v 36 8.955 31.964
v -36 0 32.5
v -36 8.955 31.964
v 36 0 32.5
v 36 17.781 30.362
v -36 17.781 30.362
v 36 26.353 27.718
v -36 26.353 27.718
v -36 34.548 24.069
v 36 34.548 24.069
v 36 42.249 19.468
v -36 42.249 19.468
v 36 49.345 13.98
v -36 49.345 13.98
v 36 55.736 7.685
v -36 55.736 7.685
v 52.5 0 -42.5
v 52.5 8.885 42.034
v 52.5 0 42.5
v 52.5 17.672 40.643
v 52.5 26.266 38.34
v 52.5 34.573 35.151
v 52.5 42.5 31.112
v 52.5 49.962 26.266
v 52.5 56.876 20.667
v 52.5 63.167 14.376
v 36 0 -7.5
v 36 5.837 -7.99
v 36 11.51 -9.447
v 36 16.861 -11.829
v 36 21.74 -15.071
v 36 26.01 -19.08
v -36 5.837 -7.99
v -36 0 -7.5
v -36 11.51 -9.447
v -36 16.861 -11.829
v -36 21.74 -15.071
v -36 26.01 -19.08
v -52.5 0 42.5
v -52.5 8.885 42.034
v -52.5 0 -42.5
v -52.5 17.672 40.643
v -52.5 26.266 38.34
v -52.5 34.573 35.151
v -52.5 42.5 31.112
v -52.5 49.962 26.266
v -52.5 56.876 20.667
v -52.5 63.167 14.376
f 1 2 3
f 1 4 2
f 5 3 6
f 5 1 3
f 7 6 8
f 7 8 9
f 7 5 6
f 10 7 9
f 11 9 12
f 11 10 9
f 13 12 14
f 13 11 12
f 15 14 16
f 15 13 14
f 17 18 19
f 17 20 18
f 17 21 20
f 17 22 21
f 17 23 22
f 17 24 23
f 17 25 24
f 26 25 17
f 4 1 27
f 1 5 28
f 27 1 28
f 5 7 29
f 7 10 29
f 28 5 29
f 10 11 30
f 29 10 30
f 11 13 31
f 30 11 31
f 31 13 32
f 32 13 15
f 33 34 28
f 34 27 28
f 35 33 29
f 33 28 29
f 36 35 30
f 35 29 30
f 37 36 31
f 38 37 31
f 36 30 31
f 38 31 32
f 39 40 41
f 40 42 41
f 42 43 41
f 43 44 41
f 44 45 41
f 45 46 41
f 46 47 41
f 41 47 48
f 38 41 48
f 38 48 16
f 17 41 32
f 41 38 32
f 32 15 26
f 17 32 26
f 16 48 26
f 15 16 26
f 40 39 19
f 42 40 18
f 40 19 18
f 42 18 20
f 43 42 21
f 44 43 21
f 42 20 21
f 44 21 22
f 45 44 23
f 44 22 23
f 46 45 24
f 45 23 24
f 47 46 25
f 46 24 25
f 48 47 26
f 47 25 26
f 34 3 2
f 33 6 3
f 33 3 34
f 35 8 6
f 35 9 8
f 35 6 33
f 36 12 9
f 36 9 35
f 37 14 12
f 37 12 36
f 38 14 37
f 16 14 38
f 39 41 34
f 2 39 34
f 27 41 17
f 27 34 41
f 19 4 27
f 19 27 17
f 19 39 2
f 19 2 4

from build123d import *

# Parameters (mm, degrees)
F0_W     = 105
F0_H     = 85
F0_W_2   = 72
F0_H_2   = 40
F1_ANGLE = 48


with BuildPart() as f1:
    # F0 (on Front) → F1 (revolve)
    with BuildSketch(Plane.XZ):
        Rectangle(F0_W, F0_H)
        with Locations((0, 12.5)):
            Rectangle(F0_W_2, F0_H_2, mode=Mode.SUBTRACT)
    revolve(axis=Axis((0, 0, -42.5), (-1, 0, 0)), revolution_arc=F1_ANGLE)


solid = f1.part
